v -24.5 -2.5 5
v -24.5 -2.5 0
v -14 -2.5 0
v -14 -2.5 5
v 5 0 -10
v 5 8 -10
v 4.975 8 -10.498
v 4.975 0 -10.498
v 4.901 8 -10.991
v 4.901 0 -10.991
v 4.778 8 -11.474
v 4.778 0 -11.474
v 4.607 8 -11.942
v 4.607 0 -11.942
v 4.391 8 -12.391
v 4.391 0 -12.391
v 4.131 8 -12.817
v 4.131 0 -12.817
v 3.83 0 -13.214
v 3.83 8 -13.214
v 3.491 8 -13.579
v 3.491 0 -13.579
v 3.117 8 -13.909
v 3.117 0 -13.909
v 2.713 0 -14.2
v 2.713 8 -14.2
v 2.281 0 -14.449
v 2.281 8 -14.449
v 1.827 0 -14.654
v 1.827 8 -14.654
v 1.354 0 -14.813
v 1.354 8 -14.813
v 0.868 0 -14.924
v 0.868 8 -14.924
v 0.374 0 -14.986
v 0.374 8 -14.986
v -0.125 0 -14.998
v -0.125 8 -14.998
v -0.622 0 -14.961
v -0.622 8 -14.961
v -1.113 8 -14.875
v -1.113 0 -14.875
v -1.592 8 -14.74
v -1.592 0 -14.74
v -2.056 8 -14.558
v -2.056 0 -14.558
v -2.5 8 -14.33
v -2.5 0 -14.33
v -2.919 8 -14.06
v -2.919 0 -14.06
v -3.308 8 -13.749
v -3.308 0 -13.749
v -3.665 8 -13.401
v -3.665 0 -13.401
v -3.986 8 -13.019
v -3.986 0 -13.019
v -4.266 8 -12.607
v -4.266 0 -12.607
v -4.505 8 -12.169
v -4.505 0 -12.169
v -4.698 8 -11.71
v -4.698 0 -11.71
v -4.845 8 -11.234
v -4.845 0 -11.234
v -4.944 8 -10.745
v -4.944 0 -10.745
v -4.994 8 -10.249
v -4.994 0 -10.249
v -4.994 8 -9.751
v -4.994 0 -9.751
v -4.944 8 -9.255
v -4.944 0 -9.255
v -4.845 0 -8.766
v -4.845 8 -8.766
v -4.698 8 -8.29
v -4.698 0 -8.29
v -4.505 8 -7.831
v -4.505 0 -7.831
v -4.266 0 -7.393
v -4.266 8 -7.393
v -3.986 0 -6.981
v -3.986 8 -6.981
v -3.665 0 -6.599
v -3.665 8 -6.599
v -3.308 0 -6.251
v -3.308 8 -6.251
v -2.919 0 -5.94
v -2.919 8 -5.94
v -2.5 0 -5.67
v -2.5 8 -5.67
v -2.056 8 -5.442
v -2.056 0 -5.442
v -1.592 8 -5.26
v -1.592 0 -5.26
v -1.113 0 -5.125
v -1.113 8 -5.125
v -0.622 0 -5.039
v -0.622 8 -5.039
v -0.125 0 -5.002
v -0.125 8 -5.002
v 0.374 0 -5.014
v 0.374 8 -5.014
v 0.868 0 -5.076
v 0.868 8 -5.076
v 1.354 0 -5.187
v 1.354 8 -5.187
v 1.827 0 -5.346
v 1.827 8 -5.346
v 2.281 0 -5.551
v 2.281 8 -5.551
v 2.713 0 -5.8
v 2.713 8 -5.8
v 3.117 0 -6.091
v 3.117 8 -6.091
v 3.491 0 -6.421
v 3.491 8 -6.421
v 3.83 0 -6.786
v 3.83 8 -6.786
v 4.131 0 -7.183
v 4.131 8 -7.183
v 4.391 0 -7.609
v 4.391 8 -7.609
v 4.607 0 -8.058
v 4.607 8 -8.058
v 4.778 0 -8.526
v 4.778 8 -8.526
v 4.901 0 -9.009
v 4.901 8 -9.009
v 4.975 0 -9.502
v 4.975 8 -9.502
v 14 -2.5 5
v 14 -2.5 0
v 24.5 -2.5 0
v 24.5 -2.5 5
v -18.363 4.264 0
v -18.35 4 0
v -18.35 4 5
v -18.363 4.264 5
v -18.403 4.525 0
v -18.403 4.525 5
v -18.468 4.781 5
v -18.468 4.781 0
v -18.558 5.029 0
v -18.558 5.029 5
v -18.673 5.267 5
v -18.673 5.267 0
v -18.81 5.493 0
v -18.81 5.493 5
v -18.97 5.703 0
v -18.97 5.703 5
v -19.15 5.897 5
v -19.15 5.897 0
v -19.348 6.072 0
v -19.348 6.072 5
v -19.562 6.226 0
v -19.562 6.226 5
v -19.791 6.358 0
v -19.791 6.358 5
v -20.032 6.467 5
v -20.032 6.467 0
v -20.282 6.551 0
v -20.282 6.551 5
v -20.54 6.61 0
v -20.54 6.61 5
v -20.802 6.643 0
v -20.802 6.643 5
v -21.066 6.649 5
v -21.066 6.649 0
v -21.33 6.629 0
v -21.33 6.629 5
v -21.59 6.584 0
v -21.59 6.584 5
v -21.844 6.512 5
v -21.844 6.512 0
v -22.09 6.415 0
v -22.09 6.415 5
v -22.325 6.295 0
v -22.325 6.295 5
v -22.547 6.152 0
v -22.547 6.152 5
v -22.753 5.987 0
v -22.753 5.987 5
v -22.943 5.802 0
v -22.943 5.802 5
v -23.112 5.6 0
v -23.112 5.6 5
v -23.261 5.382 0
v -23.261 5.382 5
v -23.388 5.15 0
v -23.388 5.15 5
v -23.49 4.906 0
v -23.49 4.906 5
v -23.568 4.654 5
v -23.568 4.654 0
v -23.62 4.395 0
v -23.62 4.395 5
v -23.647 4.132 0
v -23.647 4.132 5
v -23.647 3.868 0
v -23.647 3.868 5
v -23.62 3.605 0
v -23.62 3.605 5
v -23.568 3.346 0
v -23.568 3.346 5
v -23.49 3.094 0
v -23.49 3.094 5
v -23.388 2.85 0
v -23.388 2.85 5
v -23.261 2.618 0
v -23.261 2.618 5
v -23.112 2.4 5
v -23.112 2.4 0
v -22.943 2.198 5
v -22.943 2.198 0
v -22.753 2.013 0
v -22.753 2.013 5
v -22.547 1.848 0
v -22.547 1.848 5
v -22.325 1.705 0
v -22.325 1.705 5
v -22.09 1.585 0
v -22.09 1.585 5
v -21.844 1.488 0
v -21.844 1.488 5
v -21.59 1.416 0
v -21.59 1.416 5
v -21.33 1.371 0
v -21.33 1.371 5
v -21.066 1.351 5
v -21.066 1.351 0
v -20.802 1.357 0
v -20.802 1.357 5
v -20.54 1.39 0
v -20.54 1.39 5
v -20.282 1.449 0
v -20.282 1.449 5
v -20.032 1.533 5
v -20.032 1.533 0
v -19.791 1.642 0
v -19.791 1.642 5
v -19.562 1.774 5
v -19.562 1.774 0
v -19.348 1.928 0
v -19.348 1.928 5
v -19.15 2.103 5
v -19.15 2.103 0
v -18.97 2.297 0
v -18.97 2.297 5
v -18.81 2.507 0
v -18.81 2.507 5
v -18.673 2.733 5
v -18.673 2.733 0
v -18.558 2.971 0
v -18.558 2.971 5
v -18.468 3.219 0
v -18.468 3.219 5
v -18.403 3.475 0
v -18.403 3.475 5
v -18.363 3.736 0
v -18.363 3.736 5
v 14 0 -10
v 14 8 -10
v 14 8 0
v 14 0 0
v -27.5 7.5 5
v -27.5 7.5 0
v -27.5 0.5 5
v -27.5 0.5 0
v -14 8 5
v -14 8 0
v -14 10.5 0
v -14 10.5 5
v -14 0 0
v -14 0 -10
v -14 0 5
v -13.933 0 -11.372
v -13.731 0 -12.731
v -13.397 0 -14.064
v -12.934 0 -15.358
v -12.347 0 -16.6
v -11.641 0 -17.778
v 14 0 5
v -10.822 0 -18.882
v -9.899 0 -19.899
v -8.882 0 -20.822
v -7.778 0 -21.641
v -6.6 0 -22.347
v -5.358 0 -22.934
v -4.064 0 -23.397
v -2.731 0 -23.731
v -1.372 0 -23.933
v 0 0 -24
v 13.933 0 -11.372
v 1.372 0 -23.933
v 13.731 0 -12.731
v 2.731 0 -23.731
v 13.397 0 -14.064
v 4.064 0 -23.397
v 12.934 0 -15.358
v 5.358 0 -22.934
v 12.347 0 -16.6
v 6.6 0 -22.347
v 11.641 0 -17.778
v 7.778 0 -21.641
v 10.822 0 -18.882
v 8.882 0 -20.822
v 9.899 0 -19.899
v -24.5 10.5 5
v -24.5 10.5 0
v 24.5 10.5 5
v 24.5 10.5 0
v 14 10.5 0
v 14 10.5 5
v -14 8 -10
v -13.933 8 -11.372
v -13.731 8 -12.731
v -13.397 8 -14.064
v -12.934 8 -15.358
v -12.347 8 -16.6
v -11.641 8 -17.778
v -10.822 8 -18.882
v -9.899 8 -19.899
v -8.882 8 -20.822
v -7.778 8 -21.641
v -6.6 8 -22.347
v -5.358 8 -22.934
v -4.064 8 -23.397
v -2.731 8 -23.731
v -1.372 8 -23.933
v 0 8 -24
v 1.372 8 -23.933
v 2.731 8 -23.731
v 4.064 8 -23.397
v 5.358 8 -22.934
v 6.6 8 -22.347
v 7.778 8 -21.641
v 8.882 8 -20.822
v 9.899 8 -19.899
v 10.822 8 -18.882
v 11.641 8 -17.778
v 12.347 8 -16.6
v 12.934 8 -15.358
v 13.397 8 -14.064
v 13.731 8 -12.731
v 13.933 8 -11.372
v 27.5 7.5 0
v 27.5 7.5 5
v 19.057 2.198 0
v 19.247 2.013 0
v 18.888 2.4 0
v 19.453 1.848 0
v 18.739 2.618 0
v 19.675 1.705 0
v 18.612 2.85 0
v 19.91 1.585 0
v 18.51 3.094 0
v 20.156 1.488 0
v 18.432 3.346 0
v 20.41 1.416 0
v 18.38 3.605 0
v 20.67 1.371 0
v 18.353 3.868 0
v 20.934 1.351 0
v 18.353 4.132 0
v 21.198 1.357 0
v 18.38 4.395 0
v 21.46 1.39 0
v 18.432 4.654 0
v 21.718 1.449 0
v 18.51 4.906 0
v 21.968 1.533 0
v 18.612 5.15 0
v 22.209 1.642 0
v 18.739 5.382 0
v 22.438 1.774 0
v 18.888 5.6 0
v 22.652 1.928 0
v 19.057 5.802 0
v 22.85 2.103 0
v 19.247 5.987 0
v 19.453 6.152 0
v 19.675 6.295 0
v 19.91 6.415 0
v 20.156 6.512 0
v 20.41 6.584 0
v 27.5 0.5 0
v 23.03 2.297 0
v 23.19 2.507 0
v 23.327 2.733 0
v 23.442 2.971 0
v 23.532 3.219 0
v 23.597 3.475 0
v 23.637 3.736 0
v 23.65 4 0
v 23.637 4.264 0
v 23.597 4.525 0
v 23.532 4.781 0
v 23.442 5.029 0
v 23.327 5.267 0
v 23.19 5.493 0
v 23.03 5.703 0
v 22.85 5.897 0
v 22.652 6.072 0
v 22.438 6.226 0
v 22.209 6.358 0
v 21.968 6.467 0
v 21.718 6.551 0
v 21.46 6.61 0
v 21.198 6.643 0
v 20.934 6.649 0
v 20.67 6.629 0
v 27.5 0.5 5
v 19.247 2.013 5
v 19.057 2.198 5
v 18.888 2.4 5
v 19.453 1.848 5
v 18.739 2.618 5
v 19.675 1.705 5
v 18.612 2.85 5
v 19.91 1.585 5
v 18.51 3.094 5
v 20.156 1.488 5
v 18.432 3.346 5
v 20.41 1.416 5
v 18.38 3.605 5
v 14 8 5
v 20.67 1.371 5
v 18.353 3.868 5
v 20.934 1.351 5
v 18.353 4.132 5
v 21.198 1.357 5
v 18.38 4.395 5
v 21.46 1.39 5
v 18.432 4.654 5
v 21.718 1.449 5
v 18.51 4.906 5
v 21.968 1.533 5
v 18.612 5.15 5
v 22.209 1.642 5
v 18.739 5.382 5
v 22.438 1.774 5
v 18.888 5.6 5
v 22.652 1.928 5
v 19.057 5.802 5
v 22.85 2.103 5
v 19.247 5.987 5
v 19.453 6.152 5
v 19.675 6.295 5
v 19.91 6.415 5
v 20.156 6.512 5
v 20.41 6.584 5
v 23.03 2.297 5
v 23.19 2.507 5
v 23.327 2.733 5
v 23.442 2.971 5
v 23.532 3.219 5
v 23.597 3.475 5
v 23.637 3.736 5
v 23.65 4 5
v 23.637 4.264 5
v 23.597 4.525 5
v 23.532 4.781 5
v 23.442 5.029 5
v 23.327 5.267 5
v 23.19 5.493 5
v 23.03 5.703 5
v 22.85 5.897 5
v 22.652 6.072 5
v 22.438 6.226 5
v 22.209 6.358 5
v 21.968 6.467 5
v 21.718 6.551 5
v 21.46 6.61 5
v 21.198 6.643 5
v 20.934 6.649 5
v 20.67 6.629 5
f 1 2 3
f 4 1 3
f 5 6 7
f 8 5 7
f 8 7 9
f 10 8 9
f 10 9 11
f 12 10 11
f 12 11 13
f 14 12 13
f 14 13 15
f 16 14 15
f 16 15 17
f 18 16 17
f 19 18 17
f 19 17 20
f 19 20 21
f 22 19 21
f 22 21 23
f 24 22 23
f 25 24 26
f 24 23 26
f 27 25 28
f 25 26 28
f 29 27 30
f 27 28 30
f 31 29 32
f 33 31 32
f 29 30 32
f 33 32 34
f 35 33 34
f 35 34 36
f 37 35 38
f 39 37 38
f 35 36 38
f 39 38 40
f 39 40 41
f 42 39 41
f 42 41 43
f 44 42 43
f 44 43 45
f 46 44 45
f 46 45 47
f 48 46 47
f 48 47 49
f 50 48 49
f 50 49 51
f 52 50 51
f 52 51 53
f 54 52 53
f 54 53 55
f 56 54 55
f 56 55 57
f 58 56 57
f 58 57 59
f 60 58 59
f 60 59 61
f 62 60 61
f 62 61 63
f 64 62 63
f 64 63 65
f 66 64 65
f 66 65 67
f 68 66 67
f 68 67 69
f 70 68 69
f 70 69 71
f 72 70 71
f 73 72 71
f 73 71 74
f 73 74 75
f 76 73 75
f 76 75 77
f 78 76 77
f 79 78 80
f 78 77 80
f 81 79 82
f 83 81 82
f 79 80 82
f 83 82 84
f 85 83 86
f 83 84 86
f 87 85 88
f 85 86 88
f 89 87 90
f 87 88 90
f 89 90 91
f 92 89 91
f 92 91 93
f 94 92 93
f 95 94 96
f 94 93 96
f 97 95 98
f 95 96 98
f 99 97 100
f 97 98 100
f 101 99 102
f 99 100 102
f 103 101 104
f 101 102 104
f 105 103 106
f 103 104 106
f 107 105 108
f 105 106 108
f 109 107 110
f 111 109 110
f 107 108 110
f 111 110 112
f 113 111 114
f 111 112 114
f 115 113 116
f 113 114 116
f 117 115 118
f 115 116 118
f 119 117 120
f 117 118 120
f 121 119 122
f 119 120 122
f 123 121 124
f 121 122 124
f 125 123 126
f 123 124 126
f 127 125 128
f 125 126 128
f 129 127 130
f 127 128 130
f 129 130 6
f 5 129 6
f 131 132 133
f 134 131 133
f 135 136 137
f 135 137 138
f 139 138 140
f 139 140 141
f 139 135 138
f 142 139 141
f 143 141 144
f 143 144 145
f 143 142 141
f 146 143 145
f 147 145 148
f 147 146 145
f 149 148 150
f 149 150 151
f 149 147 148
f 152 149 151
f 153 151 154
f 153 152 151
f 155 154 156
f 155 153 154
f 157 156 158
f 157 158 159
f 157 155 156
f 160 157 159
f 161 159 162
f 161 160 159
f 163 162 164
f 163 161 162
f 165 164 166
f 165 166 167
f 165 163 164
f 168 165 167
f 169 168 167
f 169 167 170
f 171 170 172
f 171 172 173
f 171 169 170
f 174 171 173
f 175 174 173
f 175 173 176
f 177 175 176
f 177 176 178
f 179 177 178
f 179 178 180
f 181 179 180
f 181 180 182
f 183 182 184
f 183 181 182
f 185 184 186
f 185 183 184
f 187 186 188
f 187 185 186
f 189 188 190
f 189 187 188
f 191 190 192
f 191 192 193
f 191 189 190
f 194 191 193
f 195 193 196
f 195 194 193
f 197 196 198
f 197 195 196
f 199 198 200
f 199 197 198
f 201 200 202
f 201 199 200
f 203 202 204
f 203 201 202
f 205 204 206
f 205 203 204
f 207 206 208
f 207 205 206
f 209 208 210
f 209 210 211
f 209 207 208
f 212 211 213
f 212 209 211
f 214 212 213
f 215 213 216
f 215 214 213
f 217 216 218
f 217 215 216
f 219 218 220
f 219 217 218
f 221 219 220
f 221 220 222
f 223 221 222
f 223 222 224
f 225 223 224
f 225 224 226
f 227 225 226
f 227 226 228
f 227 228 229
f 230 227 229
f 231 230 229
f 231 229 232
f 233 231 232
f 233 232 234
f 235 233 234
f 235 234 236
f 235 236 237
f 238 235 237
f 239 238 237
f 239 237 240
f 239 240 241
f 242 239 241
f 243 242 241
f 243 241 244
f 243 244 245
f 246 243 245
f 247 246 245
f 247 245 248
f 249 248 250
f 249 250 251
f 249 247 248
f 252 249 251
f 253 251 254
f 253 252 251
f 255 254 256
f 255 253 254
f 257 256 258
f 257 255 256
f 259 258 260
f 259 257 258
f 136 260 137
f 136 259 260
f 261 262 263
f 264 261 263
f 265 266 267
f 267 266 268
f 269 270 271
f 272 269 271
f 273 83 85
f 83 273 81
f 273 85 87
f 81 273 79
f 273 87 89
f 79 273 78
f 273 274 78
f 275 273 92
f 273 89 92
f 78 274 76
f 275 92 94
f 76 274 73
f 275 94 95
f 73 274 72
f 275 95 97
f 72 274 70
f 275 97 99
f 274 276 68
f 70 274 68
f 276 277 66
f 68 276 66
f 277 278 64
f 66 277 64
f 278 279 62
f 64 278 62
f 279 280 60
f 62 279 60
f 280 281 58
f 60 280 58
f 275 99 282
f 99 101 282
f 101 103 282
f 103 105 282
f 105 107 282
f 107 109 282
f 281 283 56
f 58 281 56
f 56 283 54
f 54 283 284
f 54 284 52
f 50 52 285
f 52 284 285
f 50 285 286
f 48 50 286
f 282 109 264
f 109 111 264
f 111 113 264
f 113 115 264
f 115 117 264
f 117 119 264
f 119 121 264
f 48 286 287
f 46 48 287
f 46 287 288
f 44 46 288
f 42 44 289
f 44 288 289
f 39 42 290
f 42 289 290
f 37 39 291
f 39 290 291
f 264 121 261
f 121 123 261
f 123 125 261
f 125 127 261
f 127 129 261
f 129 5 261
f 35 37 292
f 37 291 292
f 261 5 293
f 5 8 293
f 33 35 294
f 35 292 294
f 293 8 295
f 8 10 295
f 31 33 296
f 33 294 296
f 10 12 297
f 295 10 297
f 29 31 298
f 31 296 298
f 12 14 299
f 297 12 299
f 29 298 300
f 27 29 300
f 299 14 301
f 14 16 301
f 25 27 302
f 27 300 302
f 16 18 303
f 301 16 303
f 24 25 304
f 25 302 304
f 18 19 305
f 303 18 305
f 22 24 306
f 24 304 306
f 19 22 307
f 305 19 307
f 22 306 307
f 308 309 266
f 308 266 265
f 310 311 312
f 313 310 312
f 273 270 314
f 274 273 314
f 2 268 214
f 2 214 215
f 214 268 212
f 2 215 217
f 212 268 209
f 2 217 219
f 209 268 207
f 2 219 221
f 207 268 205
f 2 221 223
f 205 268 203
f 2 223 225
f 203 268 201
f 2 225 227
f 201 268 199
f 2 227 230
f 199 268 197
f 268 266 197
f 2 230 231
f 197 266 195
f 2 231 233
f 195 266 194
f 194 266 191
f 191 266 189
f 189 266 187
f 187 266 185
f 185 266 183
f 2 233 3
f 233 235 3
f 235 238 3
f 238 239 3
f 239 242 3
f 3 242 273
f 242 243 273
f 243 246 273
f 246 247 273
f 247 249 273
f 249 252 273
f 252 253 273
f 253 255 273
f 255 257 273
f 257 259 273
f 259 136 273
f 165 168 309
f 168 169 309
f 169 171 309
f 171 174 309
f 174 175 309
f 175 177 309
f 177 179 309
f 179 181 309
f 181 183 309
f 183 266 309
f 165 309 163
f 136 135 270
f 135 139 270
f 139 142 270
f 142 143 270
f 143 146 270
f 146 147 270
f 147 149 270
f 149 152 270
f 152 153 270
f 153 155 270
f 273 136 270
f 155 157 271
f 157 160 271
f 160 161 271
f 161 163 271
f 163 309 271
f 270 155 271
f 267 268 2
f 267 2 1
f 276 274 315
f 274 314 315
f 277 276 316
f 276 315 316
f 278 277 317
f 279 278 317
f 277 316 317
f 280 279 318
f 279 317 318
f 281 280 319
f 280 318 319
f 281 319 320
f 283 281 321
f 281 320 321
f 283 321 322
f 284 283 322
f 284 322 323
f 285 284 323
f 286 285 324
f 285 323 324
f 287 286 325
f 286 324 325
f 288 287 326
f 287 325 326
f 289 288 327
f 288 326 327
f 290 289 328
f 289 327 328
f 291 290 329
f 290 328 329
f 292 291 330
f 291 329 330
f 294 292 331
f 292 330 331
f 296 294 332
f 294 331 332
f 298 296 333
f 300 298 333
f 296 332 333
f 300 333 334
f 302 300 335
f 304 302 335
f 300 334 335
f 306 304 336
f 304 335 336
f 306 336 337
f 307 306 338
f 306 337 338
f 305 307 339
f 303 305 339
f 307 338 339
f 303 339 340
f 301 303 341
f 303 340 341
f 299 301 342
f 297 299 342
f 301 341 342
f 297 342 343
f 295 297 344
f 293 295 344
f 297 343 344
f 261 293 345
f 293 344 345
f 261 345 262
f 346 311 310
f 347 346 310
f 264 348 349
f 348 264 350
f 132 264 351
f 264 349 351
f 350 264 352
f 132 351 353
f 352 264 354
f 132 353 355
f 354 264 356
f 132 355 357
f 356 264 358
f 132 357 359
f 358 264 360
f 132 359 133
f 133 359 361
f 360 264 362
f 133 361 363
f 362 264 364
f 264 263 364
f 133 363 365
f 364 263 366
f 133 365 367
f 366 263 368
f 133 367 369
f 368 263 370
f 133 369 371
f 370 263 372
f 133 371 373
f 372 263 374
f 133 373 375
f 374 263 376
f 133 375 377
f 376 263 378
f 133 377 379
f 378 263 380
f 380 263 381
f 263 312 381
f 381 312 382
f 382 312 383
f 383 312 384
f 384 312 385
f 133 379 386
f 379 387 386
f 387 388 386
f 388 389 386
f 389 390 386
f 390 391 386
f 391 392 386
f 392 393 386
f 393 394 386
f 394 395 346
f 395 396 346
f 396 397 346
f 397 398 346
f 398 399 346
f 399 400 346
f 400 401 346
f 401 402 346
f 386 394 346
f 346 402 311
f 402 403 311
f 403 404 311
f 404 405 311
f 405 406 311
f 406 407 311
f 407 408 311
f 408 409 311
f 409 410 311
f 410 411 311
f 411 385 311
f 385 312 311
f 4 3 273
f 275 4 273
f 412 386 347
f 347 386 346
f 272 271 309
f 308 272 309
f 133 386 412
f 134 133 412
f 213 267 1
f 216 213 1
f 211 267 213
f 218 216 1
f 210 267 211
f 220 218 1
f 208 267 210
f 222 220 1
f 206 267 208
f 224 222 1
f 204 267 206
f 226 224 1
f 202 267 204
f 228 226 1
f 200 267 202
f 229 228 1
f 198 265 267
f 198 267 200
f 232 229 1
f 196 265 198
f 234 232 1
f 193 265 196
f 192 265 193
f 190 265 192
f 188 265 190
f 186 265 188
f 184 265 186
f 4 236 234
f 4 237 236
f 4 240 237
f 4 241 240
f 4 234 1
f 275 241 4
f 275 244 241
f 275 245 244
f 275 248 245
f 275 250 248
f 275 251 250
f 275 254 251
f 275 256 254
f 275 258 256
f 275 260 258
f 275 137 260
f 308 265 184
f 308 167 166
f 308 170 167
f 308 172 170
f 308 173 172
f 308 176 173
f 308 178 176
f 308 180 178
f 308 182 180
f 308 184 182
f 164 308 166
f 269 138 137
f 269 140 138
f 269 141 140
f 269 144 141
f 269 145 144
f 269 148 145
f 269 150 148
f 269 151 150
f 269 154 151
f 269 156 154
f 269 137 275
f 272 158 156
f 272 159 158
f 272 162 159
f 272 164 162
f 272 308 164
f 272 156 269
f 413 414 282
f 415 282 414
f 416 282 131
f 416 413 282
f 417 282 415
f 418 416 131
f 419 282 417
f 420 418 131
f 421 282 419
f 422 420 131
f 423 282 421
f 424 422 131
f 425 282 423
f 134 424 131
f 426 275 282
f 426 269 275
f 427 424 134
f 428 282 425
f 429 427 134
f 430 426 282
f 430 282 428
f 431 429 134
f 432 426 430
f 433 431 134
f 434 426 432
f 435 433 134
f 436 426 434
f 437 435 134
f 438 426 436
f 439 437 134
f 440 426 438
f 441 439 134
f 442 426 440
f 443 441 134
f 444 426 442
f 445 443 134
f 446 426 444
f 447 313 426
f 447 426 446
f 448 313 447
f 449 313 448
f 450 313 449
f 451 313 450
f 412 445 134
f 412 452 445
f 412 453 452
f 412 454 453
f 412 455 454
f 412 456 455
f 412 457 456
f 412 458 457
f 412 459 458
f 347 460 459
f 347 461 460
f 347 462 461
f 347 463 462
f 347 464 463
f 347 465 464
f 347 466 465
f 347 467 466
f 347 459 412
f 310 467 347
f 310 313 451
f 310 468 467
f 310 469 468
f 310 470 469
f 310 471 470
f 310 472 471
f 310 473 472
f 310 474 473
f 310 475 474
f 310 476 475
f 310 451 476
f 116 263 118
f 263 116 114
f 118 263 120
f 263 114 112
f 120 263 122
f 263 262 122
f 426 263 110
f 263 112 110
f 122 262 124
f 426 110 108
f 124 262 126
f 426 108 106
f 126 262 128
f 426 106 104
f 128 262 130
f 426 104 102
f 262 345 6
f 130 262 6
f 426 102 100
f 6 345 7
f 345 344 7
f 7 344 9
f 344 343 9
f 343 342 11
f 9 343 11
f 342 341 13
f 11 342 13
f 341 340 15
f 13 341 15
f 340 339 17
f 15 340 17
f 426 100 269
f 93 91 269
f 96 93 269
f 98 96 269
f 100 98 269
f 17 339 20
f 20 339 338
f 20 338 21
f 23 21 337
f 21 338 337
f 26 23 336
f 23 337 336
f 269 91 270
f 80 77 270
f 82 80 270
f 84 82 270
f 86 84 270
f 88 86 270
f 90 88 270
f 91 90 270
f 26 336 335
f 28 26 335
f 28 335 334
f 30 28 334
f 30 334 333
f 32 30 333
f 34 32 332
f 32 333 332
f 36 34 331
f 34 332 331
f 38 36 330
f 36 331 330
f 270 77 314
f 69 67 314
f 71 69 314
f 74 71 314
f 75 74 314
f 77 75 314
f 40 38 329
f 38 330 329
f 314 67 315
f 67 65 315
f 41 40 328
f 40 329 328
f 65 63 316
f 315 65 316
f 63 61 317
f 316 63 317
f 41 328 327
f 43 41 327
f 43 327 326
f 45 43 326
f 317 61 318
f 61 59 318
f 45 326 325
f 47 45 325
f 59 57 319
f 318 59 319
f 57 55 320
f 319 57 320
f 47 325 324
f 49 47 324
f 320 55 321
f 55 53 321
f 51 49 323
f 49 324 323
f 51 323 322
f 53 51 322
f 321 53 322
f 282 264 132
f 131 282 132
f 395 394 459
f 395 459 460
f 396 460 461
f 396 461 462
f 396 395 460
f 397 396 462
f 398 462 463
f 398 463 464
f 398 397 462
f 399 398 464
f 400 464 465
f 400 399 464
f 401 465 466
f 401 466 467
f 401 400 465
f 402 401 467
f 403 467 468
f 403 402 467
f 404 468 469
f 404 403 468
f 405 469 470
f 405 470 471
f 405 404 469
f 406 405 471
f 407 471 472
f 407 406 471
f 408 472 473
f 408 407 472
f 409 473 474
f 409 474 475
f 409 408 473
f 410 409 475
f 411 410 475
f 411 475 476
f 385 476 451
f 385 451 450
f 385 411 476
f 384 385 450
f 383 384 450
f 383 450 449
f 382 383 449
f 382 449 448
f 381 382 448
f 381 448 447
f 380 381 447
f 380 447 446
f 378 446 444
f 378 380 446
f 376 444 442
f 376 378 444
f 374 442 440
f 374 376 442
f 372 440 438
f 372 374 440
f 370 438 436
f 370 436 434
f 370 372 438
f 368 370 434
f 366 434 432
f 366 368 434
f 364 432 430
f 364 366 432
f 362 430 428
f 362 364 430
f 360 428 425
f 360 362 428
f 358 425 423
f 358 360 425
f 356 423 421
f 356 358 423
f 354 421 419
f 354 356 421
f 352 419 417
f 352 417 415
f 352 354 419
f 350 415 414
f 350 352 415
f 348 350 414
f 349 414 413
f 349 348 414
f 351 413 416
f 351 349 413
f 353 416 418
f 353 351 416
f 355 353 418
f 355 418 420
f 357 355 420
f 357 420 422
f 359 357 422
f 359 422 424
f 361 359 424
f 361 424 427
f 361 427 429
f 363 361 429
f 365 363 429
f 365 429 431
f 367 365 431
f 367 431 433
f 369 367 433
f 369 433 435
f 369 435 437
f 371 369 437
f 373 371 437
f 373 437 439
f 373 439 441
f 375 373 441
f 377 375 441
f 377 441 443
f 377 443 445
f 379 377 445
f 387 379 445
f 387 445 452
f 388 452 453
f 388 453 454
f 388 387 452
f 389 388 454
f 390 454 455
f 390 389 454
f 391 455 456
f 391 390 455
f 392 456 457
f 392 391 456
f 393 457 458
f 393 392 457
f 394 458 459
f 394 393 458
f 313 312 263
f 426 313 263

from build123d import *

# Parameters (mm, degrees)
SKETCH1_R           = 2.65
SKETCH1_W           = 1
SKETCH1_H           = 8
SKETCH1_W_2         = 14
BOSS_EXTRUDE1_DEPTH = 5
CHAMFER1_SIZE       = 3
BOSS_EXTRUDE2_DEPTH = 4
SKETCH3_R           = 5
CUT_EXTRUDE1_DEPTH  = 11.5


with BuildPart() as part:
    # Sketch1 → Boss-Extrude1 (new body)
    with BuildSketch(Plane.XY):
        Polygon((-14, -2.5), (-14, 0), (-15, 0), (-15, 8), (-14, 8), (-14, 10.5), (-27.5, 10.5), (-27.5, -2.5), align=None)
        with Locations((-21, 4)):
            Circle(SKETCH1_R, mode=Mode.SUBTRACT)
        with Locations((-14.5, 4)):
            Rectangle(SKETCH1_W, SKETCH1_H)
        with Locations((-7, 4)):
            Rectangle(SKETCH1_W_2, SKETCH1_H)
        with Locations((7, 4)):
            Rectangle(SKETCH1_W_2, SKETCH1_H)
        with Locations((14.5, 4)):
            Rectangle(SKETCH1_W, SKETCH1_H)
        Polygon((15, 8), (15, 0), (14, 0), (14, -2.5), (27.5, -2.5), (27.5, 10.5), (14, 10.5), (14, 8), align=None)
        with Locations((21, 4)):
            Circle(SKETCH1_R, mode=Mode.SUBTRACT)
    extrude(amount=BOSS_EXTRUDE1_DEPTH)

    # Chamfer1
    chamfer1_edges = [part.edges().sort_by_distance(p)[0] for p in [
        (27.5, 10.5, 2.5),
        (27.5, -2.5, 2.5),
        (-27.5, -2.5, 2.5),
        (-27.5, 10.5, 2.5),
    ]]
    chamfer(chamfer1_edges, length=CHAMFER1_SIZE)

    # Sketch2 → Boss-Extrude2 (add, symmetric)
    with BuildSketch(Plane(origin=(0, 4, 0), x_dir=(1, 0, 0), z_dir=(0, 1, 0))):
        with BuildLine():
            Line((-14, -5), (-14, 10))
            ThreePointArc((-14, 10), (0, 24), (14, 10))
            Line((14, 10), (14, -5))
            Line((14, -5), (-14, -5))
        make_face()
    extrude(amount=BOSS_EXTRUDE2_DEPTH, both=True)

    # Sketch3 → Cut-Extrude1 (cut, through all)
    with BuildSketch(Plane(origin=(0, 8, 0), x_dir=(1, 0, 0), z_dir=(0, 1, 0))):
        with Locations((0, 10)):
            Circle(SKETCH3_R)
    extrude(amount=-CUT_EXTRUDE1_DEPTH, mode=Mode.SUBTRACT)


solid = part.part
